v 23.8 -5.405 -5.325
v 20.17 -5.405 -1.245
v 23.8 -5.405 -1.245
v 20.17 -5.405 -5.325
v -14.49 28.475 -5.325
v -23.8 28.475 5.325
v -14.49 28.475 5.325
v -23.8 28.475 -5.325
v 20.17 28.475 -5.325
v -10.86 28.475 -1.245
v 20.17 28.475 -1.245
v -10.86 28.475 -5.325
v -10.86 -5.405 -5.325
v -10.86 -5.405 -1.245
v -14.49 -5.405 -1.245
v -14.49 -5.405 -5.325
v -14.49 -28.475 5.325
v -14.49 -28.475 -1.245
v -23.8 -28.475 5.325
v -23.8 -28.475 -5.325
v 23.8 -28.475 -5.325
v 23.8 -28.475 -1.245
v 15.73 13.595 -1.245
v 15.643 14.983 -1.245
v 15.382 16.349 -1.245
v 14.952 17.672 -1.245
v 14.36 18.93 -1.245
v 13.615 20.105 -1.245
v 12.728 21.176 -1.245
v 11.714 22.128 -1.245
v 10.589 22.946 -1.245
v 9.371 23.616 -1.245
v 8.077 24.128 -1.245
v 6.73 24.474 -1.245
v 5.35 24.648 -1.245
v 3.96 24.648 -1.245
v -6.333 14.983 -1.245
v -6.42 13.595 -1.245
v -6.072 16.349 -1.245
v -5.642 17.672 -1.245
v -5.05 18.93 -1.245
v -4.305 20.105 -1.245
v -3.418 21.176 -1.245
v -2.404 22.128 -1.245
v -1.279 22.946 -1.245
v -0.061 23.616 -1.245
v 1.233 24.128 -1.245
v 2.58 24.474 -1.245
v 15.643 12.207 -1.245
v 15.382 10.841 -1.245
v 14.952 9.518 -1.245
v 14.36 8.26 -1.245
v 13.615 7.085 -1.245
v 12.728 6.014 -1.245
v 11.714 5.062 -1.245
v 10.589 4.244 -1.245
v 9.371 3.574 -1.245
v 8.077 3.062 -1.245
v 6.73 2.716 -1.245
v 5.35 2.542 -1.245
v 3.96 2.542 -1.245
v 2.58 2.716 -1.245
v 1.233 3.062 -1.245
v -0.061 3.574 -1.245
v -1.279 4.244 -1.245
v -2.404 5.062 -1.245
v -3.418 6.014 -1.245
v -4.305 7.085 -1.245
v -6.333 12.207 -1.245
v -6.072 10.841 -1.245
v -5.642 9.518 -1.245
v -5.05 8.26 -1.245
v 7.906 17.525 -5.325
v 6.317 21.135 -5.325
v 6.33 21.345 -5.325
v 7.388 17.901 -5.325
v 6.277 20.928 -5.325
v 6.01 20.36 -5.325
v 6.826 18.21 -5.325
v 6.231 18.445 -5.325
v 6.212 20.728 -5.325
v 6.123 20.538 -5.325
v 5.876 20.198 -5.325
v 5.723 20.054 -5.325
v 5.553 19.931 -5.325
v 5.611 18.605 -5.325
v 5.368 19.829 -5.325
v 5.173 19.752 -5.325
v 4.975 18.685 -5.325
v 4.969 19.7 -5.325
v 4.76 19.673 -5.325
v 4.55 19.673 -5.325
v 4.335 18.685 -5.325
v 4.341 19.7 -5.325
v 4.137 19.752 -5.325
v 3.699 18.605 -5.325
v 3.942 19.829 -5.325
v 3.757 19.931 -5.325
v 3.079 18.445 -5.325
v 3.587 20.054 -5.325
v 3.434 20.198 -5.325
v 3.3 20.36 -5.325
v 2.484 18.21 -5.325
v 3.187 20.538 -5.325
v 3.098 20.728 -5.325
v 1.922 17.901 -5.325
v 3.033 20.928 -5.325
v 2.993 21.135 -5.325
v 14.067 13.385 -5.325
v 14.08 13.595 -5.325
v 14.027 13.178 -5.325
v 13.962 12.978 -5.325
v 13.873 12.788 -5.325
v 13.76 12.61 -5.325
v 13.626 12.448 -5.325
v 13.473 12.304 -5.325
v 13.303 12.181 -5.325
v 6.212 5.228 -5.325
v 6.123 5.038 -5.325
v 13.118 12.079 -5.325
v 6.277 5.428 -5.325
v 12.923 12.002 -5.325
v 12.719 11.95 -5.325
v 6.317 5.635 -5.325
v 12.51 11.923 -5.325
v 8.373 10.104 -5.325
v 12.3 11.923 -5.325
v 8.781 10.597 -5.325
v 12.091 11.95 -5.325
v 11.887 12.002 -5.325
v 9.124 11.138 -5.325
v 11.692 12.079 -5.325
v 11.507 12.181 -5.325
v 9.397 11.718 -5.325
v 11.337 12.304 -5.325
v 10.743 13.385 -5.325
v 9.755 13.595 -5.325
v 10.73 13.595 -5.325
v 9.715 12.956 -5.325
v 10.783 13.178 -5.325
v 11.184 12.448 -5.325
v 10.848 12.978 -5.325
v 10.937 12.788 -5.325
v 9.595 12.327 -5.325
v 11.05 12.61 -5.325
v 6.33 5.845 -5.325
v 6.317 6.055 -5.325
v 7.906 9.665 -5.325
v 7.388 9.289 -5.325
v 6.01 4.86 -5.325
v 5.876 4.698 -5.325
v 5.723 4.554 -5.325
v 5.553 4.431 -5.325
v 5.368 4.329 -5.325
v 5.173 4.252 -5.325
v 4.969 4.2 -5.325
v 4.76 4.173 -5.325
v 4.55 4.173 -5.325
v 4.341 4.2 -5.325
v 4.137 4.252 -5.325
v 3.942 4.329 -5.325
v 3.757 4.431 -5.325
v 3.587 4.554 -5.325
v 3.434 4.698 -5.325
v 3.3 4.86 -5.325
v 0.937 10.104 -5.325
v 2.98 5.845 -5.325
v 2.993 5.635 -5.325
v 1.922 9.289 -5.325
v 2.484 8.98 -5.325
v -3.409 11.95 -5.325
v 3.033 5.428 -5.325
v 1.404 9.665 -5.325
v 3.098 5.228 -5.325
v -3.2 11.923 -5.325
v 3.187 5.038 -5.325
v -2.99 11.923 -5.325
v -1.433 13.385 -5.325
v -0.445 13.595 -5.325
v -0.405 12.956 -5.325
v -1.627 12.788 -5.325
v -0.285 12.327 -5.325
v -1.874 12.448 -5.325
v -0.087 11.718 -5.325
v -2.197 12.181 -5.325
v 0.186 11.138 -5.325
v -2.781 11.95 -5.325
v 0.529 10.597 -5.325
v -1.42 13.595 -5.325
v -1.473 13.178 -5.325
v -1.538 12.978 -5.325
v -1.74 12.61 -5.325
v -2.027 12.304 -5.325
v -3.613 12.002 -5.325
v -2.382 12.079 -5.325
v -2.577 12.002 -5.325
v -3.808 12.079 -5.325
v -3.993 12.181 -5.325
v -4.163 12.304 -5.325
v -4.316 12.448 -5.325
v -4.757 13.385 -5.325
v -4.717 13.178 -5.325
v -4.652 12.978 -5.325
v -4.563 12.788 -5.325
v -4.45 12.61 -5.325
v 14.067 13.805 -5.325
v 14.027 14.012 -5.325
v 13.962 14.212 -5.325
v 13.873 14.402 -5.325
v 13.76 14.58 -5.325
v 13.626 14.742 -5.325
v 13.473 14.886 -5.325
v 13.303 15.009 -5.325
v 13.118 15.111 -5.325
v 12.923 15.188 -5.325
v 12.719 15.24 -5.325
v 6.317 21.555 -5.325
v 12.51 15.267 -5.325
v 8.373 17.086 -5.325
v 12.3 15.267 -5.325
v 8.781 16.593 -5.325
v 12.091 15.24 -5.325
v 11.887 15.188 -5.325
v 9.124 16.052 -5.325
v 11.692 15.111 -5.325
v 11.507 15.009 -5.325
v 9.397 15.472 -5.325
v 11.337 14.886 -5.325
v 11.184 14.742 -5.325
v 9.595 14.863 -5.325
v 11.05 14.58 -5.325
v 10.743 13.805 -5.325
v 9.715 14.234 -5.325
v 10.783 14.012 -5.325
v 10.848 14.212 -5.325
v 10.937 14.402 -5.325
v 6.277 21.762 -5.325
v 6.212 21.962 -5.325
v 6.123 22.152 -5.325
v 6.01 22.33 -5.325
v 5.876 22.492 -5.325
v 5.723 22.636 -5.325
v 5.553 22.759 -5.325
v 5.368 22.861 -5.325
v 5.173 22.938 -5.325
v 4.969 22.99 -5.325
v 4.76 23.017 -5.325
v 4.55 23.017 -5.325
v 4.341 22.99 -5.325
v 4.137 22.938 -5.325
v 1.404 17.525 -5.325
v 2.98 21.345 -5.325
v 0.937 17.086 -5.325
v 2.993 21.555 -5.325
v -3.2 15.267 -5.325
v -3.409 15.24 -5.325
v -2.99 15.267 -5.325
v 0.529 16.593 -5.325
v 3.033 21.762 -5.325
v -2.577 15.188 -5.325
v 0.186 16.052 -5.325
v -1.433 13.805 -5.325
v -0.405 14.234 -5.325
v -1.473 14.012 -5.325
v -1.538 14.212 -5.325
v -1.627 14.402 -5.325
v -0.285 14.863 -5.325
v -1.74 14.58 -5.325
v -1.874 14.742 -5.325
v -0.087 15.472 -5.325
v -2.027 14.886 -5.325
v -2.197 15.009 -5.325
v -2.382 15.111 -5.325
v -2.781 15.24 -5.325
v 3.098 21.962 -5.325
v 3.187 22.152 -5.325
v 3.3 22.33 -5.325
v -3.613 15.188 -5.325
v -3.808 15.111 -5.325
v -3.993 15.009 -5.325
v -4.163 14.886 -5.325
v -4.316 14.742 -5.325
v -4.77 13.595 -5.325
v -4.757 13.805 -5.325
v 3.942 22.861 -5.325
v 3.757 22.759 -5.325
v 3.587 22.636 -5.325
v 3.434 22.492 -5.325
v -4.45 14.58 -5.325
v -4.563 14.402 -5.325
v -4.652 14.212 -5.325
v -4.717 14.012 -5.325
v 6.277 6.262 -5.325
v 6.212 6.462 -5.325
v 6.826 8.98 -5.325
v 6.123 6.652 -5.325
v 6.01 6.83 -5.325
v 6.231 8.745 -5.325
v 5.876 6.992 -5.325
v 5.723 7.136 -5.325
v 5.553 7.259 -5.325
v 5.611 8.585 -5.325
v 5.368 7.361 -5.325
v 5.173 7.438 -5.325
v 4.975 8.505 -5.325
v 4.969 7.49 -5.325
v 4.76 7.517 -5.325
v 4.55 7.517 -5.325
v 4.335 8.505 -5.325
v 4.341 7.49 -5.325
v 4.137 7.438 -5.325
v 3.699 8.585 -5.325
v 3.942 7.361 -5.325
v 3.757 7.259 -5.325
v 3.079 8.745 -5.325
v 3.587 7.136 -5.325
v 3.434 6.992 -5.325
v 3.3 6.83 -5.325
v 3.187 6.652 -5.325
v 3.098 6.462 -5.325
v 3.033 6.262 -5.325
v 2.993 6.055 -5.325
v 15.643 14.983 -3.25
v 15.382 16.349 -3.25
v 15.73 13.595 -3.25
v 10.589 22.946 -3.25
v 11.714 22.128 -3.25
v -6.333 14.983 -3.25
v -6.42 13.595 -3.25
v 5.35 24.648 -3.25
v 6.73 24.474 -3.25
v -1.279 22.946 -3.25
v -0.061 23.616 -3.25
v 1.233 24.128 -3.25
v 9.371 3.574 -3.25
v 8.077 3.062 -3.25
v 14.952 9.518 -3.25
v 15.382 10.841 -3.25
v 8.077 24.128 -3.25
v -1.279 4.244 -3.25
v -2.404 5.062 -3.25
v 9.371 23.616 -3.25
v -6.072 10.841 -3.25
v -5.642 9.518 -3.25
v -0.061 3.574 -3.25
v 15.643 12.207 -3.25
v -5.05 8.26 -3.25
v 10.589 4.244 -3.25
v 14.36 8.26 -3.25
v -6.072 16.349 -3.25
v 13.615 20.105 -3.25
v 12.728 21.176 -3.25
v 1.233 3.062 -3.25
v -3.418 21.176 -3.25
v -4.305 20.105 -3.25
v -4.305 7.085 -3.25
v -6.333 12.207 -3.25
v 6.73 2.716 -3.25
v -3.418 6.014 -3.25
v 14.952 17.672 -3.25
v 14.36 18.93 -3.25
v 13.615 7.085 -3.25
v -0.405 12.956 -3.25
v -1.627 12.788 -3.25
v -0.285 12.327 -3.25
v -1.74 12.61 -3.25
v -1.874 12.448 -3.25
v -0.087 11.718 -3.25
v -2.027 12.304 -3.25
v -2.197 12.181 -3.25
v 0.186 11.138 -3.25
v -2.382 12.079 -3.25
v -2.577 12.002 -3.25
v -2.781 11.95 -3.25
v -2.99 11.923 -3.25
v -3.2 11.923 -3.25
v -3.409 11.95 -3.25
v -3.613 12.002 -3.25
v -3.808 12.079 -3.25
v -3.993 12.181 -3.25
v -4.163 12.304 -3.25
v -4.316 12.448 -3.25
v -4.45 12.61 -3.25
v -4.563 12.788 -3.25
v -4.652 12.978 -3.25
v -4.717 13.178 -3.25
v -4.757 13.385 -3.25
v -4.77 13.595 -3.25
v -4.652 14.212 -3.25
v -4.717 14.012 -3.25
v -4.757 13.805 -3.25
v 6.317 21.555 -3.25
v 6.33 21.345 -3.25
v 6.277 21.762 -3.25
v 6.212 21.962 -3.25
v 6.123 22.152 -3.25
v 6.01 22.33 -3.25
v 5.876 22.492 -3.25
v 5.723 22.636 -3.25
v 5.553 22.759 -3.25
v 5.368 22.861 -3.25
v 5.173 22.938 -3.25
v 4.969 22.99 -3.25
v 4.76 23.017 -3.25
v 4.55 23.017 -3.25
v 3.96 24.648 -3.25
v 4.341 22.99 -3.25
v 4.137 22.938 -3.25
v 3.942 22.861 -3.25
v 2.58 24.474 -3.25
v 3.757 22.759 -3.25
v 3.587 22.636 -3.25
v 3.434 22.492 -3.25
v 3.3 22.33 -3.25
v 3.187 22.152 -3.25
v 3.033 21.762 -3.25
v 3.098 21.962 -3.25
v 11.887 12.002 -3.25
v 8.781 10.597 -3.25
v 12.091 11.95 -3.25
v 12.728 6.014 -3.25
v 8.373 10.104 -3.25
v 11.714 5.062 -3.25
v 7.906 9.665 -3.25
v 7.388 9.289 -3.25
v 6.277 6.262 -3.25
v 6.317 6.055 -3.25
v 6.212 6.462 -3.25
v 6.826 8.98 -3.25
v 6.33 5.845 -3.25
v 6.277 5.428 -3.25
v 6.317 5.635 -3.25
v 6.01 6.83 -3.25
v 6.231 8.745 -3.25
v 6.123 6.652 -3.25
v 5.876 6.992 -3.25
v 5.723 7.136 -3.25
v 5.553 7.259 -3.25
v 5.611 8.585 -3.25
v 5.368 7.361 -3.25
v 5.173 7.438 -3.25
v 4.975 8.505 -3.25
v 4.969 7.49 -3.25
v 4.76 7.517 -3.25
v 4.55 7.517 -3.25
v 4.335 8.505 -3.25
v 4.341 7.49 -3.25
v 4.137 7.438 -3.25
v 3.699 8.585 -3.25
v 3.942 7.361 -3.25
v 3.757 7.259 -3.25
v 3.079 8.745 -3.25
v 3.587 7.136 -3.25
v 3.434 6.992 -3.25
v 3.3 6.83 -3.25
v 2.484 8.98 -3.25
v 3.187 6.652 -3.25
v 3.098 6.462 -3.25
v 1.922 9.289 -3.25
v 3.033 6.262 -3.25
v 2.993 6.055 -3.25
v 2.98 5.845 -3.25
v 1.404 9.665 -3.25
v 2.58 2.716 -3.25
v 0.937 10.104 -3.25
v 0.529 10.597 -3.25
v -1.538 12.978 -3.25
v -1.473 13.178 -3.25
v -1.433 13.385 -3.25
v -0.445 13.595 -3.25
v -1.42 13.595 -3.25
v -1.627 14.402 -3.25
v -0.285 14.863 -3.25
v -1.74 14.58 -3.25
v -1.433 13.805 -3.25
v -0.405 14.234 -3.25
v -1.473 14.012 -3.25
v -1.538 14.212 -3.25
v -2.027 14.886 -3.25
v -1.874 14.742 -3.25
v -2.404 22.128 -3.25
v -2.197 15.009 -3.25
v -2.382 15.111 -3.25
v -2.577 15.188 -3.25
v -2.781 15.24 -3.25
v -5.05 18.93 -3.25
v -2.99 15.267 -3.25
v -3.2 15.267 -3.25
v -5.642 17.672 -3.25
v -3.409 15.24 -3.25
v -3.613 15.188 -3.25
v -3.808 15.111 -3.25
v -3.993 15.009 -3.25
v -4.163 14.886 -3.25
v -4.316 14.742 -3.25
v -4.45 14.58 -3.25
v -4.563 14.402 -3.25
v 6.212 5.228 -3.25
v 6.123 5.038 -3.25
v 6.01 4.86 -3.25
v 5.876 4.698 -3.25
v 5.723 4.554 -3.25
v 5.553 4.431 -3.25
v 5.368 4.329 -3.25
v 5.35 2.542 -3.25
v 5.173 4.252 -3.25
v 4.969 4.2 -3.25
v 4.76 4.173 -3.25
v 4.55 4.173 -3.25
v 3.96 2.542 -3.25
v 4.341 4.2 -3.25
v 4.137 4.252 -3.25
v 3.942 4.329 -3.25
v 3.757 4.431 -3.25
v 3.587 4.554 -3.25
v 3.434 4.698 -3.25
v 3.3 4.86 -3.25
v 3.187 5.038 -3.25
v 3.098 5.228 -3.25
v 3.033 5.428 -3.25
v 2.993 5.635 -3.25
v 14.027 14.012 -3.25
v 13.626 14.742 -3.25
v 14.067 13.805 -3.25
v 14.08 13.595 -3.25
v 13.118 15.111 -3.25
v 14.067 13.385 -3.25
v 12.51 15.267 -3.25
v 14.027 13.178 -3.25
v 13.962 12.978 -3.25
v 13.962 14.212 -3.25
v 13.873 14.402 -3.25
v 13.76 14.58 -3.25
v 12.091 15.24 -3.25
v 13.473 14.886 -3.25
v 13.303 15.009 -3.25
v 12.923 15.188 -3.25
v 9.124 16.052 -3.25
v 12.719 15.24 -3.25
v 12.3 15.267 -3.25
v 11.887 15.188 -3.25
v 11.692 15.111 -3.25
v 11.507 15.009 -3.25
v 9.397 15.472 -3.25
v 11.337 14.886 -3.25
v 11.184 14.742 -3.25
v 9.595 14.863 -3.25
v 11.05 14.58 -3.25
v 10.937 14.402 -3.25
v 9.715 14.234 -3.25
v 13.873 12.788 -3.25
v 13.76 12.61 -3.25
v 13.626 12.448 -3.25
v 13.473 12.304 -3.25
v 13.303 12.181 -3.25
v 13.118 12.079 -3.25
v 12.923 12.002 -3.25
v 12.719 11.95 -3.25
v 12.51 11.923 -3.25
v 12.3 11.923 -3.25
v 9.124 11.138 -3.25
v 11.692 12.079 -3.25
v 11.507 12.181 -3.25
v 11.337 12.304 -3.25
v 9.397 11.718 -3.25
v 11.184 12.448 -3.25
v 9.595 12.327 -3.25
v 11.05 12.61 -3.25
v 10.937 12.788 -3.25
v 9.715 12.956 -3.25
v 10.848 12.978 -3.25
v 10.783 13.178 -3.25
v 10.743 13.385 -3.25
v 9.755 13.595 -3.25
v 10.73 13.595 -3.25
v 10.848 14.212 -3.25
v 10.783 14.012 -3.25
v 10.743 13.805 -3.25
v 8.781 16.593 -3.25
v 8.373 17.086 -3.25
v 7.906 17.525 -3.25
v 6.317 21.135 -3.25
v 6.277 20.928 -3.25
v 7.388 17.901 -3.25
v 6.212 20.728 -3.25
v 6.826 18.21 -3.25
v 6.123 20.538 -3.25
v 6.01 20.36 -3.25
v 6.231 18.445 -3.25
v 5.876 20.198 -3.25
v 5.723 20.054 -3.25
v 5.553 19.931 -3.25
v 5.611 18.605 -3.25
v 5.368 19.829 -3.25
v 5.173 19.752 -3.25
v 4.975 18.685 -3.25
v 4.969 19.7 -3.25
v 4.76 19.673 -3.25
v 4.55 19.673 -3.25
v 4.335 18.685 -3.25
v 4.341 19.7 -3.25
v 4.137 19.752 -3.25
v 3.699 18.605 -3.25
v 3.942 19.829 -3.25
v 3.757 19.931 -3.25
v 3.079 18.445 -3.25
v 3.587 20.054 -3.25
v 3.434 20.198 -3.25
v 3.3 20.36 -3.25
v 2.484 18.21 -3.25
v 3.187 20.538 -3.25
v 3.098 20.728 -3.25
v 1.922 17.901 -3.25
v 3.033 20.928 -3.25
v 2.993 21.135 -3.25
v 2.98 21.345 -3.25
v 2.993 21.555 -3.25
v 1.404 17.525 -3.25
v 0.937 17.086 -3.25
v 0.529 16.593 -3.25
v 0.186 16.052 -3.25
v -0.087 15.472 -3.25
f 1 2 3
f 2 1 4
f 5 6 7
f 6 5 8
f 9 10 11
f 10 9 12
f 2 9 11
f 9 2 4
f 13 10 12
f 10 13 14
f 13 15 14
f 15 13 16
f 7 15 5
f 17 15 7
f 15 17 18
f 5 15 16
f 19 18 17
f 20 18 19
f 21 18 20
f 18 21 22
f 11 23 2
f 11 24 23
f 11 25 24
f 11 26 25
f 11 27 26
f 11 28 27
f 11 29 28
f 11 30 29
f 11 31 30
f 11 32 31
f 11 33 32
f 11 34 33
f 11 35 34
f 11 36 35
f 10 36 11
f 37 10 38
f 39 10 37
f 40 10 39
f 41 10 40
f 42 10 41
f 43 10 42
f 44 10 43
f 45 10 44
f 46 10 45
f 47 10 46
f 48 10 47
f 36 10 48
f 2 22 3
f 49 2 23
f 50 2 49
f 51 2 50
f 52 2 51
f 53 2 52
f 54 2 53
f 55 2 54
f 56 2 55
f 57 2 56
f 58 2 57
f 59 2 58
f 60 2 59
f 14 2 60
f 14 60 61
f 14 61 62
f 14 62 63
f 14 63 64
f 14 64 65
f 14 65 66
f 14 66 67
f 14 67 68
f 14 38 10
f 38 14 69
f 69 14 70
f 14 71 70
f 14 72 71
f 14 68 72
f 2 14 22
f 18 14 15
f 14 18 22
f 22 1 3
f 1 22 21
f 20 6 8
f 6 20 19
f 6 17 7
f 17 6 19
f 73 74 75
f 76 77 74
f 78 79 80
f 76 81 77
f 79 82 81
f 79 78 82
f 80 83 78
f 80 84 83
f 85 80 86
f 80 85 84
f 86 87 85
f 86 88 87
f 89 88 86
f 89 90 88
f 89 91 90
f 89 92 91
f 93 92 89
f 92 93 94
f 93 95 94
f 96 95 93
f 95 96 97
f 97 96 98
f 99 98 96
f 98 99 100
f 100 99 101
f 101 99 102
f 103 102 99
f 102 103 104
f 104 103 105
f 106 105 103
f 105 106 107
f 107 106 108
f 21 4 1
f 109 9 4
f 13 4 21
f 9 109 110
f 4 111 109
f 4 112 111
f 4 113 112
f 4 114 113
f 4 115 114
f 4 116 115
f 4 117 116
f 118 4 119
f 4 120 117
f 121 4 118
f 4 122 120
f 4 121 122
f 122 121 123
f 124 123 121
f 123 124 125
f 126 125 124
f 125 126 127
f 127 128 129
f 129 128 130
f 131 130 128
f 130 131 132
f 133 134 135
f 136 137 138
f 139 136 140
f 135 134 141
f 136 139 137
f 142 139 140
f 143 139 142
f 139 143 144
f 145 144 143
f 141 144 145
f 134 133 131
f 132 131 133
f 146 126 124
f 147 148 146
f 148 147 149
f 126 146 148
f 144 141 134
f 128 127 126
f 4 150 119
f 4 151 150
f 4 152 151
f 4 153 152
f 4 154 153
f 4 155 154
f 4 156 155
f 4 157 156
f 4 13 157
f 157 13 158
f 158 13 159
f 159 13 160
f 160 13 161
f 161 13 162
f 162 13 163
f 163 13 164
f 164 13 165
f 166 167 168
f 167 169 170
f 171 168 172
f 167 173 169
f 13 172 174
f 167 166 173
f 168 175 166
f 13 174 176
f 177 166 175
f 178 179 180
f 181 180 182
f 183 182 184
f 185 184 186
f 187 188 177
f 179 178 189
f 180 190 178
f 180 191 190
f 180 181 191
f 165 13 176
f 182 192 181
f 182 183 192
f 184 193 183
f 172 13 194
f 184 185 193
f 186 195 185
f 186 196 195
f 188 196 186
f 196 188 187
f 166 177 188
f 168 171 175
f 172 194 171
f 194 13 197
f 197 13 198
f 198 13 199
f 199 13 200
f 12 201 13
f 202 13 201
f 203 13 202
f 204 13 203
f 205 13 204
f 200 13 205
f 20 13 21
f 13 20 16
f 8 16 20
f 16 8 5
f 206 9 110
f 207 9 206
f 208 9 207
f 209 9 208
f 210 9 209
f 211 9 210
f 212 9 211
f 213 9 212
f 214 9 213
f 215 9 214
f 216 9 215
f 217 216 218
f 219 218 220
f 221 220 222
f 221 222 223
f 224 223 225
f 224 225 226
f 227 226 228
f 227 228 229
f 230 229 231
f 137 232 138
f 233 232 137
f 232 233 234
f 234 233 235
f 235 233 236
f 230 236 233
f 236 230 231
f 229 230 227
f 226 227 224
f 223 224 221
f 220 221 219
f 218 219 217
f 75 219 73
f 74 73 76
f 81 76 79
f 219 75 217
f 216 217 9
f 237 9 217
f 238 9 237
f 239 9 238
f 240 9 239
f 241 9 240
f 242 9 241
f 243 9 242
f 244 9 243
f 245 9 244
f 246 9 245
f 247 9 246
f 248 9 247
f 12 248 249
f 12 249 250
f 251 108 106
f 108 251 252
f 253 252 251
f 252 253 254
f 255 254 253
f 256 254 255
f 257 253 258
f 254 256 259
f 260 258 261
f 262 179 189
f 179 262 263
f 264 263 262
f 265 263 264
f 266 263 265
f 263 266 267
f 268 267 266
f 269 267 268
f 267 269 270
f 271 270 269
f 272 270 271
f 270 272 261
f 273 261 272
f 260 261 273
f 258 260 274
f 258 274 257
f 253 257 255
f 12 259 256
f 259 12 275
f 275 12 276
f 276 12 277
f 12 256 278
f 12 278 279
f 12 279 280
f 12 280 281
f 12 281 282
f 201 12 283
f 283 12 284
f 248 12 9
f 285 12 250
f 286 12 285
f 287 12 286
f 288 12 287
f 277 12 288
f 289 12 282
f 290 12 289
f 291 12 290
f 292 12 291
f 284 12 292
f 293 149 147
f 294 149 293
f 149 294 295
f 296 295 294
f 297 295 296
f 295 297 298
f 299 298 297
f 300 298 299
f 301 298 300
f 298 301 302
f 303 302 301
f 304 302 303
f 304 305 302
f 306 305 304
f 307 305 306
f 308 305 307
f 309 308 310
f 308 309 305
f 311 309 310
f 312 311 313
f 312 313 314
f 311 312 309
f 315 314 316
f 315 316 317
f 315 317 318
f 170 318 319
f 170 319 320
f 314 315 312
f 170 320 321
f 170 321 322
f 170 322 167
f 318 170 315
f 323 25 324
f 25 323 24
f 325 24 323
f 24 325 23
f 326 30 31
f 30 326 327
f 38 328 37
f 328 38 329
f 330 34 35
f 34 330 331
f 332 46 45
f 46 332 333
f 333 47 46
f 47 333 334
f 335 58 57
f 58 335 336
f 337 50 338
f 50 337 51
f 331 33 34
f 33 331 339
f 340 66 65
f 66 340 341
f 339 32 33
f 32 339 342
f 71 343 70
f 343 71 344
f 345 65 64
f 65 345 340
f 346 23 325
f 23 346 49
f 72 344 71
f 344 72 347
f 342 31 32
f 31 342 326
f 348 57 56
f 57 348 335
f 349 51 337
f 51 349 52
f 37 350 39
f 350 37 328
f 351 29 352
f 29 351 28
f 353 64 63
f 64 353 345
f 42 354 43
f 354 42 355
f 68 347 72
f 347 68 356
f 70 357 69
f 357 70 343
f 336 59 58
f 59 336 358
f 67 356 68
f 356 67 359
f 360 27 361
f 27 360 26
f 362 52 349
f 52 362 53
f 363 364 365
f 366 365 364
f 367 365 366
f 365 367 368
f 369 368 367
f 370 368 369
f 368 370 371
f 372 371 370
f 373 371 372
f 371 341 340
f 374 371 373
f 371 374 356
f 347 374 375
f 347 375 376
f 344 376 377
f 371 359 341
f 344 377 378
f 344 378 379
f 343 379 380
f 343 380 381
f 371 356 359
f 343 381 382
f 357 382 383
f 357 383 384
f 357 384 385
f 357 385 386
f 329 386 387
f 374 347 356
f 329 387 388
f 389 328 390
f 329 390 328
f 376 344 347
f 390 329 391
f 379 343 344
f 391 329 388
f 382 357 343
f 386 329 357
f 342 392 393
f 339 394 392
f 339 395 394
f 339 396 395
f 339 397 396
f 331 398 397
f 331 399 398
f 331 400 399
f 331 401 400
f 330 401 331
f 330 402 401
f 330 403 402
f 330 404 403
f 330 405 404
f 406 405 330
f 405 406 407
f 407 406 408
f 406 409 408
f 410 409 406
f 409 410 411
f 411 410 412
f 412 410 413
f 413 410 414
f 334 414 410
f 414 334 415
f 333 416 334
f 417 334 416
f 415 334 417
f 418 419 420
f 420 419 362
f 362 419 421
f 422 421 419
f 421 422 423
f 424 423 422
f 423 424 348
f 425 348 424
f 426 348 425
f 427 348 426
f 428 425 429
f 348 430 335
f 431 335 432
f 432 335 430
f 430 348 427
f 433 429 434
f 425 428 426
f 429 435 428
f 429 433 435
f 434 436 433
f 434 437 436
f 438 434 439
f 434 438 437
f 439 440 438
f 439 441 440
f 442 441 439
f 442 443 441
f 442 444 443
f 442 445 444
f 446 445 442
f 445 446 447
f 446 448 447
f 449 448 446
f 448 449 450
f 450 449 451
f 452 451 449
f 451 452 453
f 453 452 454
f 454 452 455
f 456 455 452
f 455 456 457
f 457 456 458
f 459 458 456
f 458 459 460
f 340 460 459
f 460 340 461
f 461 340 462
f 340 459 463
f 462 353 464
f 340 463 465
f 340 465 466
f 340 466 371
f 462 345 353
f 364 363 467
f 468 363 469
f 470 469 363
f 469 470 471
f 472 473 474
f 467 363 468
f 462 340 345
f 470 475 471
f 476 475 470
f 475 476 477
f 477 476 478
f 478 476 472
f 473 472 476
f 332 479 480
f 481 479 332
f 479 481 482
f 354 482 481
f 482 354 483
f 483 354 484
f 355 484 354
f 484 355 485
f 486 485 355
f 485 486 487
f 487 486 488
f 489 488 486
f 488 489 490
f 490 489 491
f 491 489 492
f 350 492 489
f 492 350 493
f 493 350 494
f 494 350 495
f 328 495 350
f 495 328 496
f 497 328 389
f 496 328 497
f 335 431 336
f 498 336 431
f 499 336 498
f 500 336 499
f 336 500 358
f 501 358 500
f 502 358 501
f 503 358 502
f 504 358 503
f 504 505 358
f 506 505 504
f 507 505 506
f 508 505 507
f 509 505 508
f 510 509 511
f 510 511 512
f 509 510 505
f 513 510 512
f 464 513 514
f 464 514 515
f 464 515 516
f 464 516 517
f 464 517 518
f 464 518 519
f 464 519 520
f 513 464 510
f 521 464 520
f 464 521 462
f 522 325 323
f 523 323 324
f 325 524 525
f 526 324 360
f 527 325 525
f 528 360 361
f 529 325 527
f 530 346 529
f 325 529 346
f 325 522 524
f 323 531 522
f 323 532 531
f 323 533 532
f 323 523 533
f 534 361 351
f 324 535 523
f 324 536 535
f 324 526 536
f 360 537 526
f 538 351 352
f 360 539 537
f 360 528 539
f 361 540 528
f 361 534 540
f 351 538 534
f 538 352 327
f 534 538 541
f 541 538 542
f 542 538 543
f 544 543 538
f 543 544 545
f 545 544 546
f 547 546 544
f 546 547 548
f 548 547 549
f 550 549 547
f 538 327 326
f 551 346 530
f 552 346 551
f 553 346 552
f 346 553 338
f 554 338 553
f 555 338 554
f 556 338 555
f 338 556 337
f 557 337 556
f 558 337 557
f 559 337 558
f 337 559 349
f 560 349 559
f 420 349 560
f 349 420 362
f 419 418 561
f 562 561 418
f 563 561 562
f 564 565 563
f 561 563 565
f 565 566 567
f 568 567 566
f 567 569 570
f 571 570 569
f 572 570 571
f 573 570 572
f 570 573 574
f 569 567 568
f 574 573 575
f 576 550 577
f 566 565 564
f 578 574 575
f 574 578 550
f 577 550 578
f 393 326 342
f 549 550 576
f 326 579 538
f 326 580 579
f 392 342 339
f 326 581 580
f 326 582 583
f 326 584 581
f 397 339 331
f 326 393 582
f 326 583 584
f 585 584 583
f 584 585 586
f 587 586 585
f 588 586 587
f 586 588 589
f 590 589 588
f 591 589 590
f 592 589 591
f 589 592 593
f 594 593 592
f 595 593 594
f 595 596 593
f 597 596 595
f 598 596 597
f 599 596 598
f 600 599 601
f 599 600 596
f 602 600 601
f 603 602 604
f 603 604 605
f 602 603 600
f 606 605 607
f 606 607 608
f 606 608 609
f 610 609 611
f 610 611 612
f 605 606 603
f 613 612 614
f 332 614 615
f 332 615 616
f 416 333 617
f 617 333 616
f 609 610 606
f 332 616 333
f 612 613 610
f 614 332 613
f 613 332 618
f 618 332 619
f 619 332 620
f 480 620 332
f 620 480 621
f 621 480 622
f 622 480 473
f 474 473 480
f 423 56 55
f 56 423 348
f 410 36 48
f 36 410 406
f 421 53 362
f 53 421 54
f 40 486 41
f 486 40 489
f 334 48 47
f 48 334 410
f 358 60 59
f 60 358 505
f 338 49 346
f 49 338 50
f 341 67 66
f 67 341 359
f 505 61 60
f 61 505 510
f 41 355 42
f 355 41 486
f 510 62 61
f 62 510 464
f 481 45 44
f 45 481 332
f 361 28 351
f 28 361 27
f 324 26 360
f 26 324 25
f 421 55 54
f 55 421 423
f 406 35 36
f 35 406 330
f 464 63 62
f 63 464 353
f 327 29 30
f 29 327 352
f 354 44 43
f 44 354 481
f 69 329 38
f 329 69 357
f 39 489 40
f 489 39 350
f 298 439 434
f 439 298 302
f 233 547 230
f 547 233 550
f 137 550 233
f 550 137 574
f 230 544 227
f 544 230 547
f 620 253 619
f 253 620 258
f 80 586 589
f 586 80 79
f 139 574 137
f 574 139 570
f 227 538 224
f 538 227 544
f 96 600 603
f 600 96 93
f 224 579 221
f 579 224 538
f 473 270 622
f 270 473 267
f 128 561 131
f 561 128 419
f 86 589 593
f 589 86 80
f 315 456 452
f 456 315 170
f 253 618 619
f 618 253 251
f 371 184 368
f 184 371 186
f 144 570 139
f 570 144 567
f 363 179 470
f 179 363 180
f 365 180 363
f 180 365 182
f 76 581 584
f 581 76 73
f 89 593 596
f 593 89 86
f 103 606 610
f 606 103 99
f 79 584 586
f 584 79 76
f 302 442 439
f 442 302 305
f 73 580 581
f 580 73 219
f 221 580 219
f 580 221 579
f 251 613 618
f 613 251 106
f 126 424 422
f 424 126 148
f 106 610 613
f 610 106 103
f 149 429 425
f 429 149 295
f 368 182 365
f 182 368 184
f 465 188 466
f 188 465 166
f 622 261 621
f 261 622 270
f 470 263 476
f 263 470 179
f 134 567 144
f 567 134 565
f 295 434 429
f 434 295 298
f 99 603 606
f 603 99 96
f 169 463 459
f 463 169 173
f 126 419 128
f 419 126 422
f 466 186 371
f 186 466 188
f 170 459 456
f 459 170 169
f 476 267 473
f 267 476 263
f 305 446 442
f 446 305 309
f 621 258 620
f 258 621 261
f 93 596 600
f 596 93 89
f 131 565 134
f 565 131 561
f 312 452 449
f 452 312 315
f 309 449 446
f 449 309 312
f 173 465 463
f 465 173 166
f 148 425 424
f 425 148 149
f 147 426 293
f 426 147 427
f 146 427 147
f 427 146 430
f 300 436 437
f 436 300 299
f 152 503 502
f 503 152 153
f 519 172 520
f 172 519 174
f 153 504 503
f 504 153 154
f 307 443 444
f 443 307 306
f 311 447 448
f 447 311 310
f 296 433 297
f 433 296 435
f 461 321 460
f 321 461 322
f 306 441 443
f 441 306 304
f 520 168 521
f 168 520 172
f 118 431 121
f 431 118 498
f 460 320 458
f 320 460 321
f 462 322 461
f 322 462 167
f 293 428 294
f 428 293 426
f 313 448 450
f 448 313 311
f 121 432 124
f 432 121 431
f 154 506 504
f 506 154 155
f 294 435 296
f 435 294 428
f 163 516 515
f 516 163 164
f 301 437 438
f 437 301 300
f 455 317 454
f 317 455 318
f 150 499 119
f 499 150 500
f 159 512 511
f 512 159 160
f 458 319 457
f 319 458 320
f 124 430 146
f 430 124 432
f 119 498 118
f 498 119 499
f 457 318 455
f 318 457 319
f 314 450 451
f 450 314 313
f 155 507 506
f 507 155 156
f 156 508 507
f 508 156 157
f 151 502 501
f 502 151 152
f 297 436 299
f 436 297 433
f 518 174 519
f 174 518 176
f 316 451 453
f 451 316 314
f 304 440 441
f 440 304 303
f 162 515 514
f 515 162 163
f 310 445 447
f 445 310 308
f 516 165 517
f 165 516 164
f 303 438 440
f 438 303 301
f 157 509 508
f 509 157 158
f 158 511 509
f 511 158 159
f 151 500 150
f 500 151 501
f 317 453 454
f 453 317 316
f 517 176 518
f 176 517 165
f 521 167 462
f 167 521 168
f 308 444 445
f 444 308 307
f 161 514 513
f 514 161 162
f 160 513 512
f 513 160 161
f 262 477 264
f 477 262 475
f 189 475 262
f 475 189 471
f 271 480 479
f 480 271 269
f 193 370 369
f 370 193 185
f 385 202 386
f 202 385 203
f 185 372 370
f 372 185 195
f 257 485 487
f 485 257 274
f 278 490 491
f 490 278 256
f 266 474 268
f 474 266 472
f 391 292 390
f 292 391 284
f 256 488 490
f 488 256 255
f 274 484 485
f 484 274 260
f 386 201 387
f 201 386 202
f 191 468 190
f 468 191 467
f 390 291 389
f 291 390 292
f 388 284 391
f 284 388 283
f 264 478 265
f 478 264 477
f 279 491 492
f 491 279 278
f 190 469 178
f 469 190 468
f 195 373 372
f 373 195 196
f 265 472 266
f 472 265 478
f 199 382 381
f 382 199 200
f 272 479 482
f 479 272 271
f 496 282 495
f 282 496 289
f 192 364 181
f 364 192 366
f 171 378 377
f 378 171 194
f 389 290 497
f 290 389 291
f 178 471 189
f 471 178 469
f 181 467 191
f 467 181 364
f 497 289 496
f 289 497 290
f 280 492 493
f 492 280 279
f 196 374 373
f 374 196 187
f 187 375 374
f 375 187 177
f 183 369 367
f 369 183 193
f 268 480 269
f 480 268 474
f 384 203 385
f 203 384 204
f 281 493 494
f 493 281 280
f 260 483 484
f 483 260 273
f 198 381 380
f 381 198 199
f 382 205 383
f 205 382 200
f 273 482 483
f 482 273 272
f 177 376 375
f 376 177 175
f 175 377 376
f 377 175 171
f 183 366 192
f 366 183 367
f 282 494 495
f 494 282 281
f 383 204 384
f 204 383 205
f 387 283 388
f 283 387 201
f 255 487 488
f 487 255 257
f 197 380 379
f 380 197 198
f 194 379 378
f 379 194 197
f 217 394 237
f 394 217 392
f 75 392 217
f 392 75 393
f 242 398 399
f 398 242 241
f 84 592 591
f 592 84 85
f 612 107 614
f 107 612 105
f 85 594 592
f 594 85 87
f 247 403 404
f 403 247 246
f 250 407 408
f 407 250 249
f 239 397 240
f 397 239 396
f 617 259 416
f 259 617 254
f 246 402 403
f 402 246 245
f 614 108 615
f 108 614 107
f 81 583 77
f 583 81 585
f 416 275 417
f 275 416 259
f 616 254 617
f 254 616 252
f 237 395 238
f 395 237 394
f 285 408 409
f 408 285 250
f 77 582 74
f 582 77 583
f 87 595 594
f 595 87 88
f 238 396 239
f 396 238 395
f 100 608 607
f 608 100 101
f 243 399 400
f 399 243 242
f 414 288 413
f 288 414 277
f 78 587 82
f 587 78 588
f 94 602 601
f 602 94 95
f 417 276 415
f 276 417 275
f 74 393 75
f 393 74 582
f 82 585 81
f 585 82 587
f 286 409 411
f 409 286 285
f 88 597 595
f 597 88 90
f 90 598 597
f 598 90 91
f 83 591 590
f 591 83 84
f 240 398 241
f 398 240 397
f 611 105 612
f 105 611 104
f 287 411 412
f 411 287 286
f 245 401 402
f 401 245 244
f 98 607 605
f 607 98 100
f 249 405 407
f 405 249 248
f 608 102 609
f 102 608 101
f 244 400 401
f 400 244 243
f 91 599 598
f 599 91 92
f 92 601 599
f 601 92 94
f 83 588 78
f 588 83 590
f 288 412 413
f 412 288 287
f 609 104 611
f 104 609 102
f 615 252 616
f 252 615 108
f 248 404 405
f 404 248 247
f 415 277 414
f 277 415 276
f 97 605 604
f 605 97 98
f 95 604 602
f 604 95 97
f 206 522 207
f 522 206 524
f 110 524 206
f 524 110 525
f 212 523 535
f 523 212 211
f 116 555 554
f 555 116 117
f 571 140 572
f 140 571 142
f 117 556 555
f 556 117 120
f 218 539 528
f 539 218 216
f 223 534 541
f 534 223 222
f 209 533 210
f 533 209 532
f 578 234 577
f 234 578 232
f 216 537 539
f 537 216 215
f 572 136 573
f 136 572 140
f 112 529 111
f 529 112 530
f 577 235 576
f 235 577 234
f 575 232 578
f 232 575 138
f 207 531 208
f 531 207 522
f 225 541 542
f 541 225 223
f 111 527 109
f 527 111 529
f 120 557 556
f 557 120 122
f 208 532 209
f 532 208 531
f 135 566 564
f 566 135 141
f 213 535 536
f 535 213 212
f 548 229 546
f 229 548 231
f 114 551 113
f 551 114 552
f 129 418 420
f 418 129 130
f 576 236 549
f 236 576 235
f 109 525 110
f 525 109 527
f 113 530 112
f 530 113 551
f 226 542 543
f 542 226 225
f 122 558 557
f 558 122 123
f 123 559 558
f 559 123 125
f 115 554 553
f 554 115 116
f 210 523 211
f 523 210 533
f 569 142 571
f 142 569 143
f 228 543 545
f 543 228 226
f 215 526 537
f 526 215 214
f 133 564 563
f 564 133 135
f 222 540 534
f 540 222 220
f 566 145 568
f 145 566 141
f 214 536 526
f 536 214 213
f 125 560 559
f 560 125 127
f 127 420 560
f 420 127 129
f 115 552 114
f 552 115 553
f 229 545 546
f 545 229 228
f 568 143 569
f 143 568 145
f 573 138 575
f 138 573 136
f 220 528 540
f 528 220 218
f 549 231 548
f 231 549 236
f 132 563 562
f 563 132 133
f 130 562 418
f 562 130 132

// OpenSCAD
$fn=50;


height=59.35 - 2.4;
width=47.60;
thickness=10.65;

topWidth=38.29;
topHeight=23.70;
bottomWidth=31.10;
bottomHeight=height-topHeight;
thickness3=6.57;



diameter=28.88;



circleThickness=2;
radius=diameter/2 + 1;

smallRecHeight=8.38;
smallRecWidth=3.33;
cuttingWidth=23.59;
cuttingHeight=14.69;
extraHeight = (height - (smallRecHeight + cuttingHeight));
extraWidth = 3.63;

bigCircleDiameter=27.33;
topHalfHeight=29.63;
remaindingHeight=height-topHalfHeight;

hex_nut_diameter=7.89 + 1.6; // +1.6, 
hex_nut_radius=hex_nut_diameter/2;
hex_nut_thickness=3.85;

hex_nut_inner_diameter= 5.8;//5;
hex_nut_inner_radius=hex_nut_inner_diameter/2 + .4;



temp=(thickness/2) - (thickness - thickness3);
offsetFromCenter=19; //19.25; //1.5 // 2.3
hexNutGroveExtraDepth=2;

screwRadius=1.75;
screwDepth=9.35;

module part1(){
translate([(width/2) - (topWidth/2) ,(thickness/2) - (thickness3)/2,0]) color("blue") difference(){    
    difference(){
cube([topWidth, thickness3, height], center=true);  

union(){
color("blue") translate([topWidth/2 - (extraWidth/2),0,-extraHeight/2 + ( (height/2) - (smallRecHeight + cuttingHeight) )]) cube([extraWidth,thickness3 ,extraHeight],center=true);

color("blue") translate([ -(topWidth/2 - (extraWidth/2)),0,-extraHeight/2 + ( (height/2) - (smallRecHeight + cuttingHeight) )]) cube([extraWidth,thickness3 ,extraHeight],center=true);
}


//translate([0,0,extraHeight - (height/2) - offsetFromCenter]) union(){
//    //-(remaindingHeight/2) + (hex_nut_radius)
//translate([0,5,0]) color("black") rotate([90,0,0]) cylinder(h=hex_nut_thickness/2 + hexNutGroveExtraDepth + 1.3, r=hex_nut_radius,center=true, $fn = 6); //h=thickness3
////-(remaindingHeight/2) + (hex_nut_inner_radius + (hex_nut_radius - hex_nut_inner_radius))
//translate([0, 0,0]) color("red") rotate([90,0,0]) cylinder(h=hex_nut_thickness/2 + 10, r=hex_nut_inner_radius,center=true, $fn = 6);
//}


}
union(){
    translate([0,-((-(thickness3/2)+(thickness3-circleThickness)/2)),(height/2) - (smallRecHeight + cuttingHeight) ]) union(){
translate([0,0,(cuttingHeight/2) + (smallRecHeight)]) cube([cuttingWidth,thickness3 - circleThickness +.1, cuttingHeight],center=true);
                 translate([0,0,smallRecHeight/2]) cube([smallRecWidth,thickness3 - circleThickness+.1,smallRecHeight],center=true);            
}


translate([0,-(thickness3/2 - (circleThickness/2)),(height/2) - (radius)]) color("red")rotate([90,0,0])union(){
        cylinder(h=circleThickness, r=radius, center=true);
        translate([0,radius/2,0])cube([radius*2,radius,circleThickness],center=true);
    }
    
    }

}
}


module part2(){
//translate([0,temp,0]) 
difference(){
cube([width,thickness,height],center=true);
//translate([0,(thickness/2) - (thickness - thickness3)/2,0]) color("blue") cube([topWidth,thickness - thickness3,height],center=true);
//
translate([(width/2) - (topWidth/2),(thickness/2) - (thickness3)/2,0]) color("blue") union(){
cube([topWidth, thickness3, height], center=true);   
union(){
color("red") translate([topWidth/2 - (extraWidth/2),0,-extraHeight/2 + ( (height/2) - (smallRecHeight + cuttingHeight) )]) cube([extraWidth,thickness3+10 ,extraHeight],center=true);

color("red") translate([ -(topWidth/2 - (extraWidth/2)),0,-extraHeight/2 + ( (height/2) - (smallRecHeight + cuttingHeight) )]) cube([extraWidth,thickness3+10,extraHeight],center=true);
}


//translate([0,0, extraHeight - (height/2)  - offsetFromCenter]) union(){
//    
//translate([0, -temp - (hex_nut_thickness/2) - .8,0]) color("red") rotate([90,0,0]) cylinder(h=hex_nut_thickness/2 + hexNutGroveExtraDepth, r=hex_nut_radius,center=true, $fn = 6);
//
//translate([0, -temp - (hex_nut_thickness/2),0]) color("red") rotate([90,0,0]) cylinder(h=hex_nut_thickness/2 + 7, r=hex_nut_inner_radius,center=true, $fn = 6);
//}


}
}

}

module glueScrews(){
translate([0,0.1,0]) union(){
rotate([90,0,0]) translate([(width/2) - (topWidth/2) - (topWidth/4),-(height/3),-(thickness-screwDepth)/2]) cylinder(h=screwDepth,r=screwRadius,center=true);

rotate([90,0,0]) translate([(width/2) - (topWidth/2) + (topWidth/4),-(height/9),-(thickness-screwDepth)/2]) cylinder(h=screwDepth,r=screwRadius,center=true);
}
}


module modifiedParts(part=1){


difference(){
    
        if(part == 1){
            part1();
        }else if(part == 2){
            part2();
        }
//        part2();    

    
//translate([(width/2) - (topWidth/2),0,extraHeight - (height/2) - offsetFromCenter]) union(){
//    //-(remaindingHeight/2) + (hex_nut_radius)
//    
//    //((hex_nut_thickness/2 + 10)/2)-(hex_nut_thickness/2 + hexNutGroveExtraDepth + 1.3)/2
//
//    
////-(remaindingHeight/2) + (hex_nut_inner_radius + (hex_nut_radius - hex_nut_inner_radius))
//
//
//translate([0,0,0]) color("black") rotate([90,0,0]) cylinder(h=hex_nut_thickness, r=hex_nut_radius,center=true, $fn = 6); //h=thickness3
//
//translate([0, 0,0]) color("red") rotate([90,0,0]) cylinder(h=hex_nut_thickness+ 20, r=hex_nut_inner_radius,center=true, $fn = 6);
//    
//
////    glueScrews();
//}

}
}

//translate([3.5,11,0]) cylinder(d=21.95,h=3.5,$fn=50,center=true);

//translate([(width/2) - (topWidth/2),-(extraHeight - (height/2) - offsetFromCenter),0]) cylinder(d=21.95,h=3.5,$fn=50,center=true);

//union(){
//translate([(width/2) - (topWidth/2),-(extraHeight - (height/2) - offsetFromCenter)-7.75,0]) cylinder(h=15,d=3.75,center=true);
//translate([(width/2) - (topWidth/2) -7.75,-(extraHeight - (height/2) - offsetFromCenter),0]) cylinder(h=15,d=3.75,center=true);
//translate([(width/2) - (topWidth/2) +7.75,-(extraHeight - (height/2) - offsetFromCenter),0]) cylinder(h=15,d=3.75,center=true);
//translate([(width/2) - (topWidth/2) ,-(extraHeight - (height/2) - offsetFromCenter) + 7.75,0]) cylinder(h=15,d=3.75,center=true);
//}


//rotate([-90,0,0]) difference(){
//modifiedParts(1);
//   glueScrews(); 
//}

//rotate([90,0,0]) translate([(width/2) - (topWidth/2),-(0),extraHeight - (height/2) - offsetFromCenter]) cylinder(d=21.95,h=3.5,$fn=50,center=true);

//rotate([90,0,0]) modifiedParts(1);

difference(){
difference(){
rotate([90,0,0]) difference(){

modifiedParts(2);
//    translate([(width/2) - (topWidth/2),-(extraHeight - (height/2) - offsetFromCenter),0]) cylinder(d=21.95,h=3.5,$fn=50,center=true);
//    glueScrews();
    
}

difference(){
//translate([0,0,.85])
    union(){
//translate([(width/2) - (topWidth/2),-(extraHeight - (height/2) - offsetFromCenter) ,-1.5]) cylinder(d=21.95 + .2,h=3.5,$fn=50,center=true);
//    
//    translate([(width/2) - (topWidth/2),-(extraHeight - (height/2) - offsetFromCenter),0]) cylinder(h=15,d=10 + .2,center=true);
    
    translate([(width/2) - (topWidth/2),-(extraHeight - (height/2) - offsetFromCenter) ,-1.5]) cylinder(d=21.95 + .2,h=3.5,$fn=50,center=true);
    
    translate([(width/2) - (topWidth/2),-(extraHeight - (height/2) - offsetFromCenter),0]) cylinder(h=15,d=10 + .2,center=true);
}


}

}


union(){
translate([(width/2) - (topWidth/2),-(extraHeight - (height/2) - offsetFromCenter)-7.75 ,0]) cylinder(h=15,d=3.75 - .4,center=true);
translate([(width/2) - (topWidth/2) -7.75 ,-(extraHeight - (height/2) - offsetFromCenter),0]) cylinder(h=15,d=3.75 - .4,center=true);
translate([(width/2) - (topWidth/2) ,-(extraHeight - (height/2) - offsetFromCenter) + 7.75 ,0]) cylinder(h=15,d=3.75 - .4,center=true);
translate([(width/2) - (topWidth/2) +7.75 ,-(extraHeight - (height/2) - offsetFromCenter),0]) cylinder(h=15,d=3.75 - .4,center=true);

}

}
